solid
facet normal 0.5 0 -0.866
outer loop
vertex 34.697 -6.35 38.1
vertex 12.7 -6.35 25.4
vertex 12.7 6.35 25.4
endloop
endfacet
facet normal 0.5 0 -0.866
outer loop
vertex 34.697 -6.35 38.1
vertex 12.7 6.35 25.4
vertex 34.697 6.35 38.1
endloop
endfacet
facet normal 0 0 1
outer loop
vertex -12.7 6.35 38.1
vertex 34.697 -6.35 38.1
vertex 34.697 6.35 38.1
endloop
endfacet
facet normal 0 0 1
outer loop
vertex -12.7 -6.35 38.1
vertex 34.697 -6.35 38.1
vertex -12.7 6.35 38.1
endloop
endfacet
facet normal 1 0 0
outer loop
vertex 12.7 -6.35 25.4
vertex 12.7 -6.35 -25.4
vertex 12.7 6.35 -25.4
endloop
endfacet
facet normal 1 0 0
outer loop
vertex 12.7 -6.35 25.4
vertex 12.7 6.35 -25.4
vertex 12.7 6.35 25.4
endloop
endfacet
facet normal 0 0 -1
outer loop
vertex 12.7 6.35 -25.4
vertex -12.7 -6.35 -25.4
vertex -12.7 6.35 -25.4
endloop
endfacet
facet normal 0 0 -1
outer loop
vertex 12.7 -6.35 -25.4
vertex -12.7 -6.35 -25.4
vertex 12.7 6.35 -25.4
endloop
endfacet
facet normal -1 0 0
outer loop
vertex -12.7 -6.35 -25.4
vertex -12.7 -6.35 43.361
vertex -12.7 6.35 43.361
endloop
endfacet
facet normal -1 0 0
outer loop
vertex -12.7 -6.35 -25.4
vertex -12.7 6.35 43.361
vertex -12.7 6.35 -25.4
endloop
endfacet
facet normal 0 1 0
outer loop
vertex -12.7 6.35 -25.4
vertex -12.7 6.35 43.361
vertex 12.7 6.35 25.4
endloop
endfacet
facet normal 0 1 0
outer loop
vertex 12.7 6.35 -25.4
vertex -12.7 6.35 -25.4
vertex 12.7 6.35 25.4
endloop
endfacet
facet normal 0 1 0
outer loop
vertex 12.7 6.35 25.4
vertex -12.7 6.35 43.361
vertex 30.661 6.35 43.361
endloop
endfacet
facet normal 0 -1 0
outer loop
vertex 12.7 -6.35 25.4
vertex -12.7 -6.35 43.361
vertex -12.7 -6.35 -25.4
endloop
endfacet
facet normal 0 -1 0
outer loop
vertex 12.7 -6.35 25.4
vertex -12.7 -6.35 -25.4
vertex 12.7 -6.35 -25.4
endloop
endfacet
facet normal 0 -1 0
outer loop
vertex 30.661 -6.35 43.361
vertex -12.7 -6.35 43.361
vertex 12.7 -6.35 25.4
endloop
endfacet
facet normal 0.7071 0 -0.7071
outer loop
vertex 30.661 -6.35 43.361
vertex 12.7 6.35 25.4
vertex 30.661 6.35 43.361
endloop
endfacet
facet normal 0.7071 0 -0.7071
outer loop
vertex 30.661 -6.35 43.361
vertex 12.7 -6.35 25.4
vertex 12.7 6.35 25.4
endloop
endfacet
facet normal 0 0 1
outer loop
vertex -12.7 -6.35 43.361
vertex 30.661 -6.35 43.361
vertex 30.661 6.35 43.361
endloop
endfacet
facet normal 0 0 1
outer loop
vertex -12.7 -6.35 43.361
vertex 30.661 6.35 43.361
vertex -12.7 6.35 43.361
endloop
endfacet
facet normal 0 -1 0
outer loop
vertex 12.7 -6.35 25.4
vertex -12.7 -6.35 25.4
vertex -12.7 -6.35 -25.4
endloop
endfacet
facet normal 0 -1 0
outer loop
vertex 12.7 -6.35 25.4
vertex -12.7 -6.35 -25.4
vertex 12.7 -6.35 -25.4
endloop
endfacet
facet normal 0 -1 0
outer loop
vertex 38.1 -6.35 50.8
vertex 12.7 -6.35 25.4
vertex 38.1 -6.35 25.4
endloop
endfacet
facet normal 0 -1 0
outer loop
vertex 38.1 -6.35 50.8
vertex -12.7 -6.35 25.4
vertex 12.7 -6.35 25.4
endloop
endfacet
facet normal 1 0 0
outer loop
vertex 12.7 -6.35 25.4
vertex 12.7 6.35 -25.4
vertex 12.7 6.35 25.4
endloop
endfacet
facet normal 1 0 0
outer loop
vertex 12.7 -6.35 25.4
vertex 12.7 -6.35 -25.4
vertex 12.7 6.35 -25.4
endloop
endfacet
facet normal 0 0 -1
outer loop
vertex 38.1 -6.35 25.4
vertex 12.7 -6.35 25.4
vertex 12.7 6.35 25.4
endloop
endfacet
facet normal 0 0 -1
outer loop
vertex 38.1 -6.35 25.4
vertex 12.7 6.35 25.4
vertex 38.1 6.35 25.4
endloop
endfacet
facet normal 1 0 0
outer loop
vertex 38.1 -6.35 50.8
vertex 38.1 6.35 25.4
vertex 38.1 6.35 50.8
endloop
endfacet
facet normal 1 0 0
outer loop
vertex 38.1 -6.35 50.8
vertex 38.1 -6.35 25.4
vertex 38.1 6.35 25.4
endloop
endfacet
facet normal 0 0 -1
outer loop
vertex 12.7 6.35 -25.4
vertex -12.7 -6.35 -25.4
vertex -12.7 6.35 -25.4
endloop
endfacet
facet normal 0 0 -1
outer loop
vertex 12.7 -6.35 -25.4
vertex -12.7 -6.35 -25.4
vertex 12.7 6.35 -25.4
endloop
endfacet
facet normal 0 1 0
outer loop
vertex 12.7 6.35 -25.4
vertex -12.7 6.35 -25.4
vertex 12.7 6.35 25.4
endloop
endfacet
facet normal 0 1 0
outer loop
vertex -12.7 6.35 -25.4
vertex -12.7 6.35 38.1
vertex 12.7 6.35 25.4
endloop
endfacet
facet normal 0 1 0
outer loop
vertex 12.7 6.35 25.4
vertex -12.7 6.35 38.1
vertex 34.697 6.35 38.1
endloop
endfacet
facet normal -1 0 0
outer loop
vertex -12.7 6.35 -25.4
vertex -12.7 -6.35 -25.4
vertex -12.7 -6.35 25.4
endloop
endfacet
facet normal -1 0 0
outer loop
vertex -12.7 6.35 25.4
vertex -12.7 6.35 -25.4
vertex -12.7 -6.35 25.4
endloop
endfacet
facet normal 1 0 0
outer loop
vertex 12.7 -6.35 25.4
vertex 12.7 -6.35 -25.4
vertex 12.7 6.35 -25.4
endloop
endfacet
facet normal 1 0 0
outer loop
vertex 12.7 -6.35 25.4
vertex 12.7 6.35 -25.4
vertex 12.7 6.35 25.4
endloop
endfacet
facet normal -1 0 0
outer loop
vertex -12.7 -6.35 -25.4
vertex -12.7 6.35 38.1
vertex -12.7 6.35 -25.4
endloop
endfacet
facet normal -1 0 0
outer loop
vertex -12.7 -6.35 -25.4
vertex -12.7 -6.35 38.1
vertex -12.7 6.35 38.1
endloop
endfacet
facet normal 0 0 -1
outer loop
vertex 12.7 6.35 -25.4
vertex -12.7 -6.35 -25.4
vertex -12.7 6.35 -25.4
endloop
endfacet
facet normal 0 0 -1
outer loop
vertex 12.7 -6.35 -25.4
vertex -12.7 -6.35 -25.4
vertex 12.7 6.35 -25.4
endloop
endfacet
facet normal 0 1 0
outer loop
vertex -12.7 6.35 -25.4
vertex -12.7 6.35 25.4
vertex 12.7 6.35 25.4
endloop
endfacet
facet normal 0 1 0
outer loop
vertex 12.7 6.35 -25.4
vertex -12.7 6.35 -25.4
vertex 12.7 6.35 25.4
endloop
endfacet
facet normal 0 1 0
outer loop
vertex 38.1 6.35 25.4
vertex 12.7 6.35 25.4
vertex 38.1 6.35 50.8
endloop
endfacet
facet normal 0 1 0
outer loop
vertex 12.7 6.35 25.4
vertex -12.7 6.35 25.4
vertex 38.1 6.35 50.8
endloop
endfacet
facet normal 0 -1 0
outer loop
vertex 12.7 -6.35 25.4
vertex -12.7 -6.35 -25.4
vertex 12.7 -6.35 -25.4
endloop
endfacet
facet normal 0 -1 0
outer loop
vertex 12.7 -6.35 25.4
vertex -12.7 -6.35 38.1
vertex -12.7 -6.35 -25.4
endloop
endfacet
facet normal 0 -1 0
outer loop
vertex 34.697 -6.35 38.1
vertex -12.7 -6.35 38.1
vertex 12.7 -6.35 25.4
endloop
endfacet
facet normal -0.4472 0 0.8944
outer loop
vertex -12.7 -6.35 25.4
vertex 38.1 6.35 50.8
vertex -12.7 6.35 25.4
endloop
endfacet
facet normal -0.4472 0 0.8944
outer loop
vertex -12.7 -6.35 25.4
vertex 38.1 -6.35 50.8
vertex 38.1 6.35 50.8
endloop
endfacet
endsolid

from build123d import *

# Parameters (mm, degrees)
F0_W     = 25.4
F0_H     = 50.8
F1_DEPTH = 6.35
F2_W     = 25.4
F2_H     = 50.8
F3_DEPTH = 6.35
F4_W     = 25.4
F4_H     = 50.8
F5_DEPTH = 6.35


with BuildPart() as f1:
    # F0 (on Front) → F1 (new body, symmetric)
    with BuildSketch(Plane.XZ):
        Rectangle(F0_W, F0_H)
        Polygon((-12.7, 25.4), (12.7, 25.4), (38.1, 25.4), (38.1, 50.8), align=None)
    extrude(amount=F1_DEPTH, both=True)


with BuildPart() as f3:
    # F2 (on Front) → F3 (new body, symmetric)
    with BuildSketch(Plane.XZ):
        Rectangle(F2_W, F2_H)
        Polygon((-12.7, 25.4), (12.7, 25.4), (34.697045, 38.1), (-12.7, 38.1), align=None)
    extrude(amount=F3_DEPTH, both=True)


with BuildPart() as f5:
    # F4 (on Front) → F5 (new body, symmetric)
    with BuildSketch(Plane.XZ):
        Polygon((-12.7, 25.4), (12.7, 25.4), (30.660512, 43.360512), (-12.7, 43.360512), align=None)
        Rectangle(F4_W, F4_H)
    extrude(amount=F5_DEPTH, both=True)


solid = Compound([f1.part, f3.part, f5.part])
